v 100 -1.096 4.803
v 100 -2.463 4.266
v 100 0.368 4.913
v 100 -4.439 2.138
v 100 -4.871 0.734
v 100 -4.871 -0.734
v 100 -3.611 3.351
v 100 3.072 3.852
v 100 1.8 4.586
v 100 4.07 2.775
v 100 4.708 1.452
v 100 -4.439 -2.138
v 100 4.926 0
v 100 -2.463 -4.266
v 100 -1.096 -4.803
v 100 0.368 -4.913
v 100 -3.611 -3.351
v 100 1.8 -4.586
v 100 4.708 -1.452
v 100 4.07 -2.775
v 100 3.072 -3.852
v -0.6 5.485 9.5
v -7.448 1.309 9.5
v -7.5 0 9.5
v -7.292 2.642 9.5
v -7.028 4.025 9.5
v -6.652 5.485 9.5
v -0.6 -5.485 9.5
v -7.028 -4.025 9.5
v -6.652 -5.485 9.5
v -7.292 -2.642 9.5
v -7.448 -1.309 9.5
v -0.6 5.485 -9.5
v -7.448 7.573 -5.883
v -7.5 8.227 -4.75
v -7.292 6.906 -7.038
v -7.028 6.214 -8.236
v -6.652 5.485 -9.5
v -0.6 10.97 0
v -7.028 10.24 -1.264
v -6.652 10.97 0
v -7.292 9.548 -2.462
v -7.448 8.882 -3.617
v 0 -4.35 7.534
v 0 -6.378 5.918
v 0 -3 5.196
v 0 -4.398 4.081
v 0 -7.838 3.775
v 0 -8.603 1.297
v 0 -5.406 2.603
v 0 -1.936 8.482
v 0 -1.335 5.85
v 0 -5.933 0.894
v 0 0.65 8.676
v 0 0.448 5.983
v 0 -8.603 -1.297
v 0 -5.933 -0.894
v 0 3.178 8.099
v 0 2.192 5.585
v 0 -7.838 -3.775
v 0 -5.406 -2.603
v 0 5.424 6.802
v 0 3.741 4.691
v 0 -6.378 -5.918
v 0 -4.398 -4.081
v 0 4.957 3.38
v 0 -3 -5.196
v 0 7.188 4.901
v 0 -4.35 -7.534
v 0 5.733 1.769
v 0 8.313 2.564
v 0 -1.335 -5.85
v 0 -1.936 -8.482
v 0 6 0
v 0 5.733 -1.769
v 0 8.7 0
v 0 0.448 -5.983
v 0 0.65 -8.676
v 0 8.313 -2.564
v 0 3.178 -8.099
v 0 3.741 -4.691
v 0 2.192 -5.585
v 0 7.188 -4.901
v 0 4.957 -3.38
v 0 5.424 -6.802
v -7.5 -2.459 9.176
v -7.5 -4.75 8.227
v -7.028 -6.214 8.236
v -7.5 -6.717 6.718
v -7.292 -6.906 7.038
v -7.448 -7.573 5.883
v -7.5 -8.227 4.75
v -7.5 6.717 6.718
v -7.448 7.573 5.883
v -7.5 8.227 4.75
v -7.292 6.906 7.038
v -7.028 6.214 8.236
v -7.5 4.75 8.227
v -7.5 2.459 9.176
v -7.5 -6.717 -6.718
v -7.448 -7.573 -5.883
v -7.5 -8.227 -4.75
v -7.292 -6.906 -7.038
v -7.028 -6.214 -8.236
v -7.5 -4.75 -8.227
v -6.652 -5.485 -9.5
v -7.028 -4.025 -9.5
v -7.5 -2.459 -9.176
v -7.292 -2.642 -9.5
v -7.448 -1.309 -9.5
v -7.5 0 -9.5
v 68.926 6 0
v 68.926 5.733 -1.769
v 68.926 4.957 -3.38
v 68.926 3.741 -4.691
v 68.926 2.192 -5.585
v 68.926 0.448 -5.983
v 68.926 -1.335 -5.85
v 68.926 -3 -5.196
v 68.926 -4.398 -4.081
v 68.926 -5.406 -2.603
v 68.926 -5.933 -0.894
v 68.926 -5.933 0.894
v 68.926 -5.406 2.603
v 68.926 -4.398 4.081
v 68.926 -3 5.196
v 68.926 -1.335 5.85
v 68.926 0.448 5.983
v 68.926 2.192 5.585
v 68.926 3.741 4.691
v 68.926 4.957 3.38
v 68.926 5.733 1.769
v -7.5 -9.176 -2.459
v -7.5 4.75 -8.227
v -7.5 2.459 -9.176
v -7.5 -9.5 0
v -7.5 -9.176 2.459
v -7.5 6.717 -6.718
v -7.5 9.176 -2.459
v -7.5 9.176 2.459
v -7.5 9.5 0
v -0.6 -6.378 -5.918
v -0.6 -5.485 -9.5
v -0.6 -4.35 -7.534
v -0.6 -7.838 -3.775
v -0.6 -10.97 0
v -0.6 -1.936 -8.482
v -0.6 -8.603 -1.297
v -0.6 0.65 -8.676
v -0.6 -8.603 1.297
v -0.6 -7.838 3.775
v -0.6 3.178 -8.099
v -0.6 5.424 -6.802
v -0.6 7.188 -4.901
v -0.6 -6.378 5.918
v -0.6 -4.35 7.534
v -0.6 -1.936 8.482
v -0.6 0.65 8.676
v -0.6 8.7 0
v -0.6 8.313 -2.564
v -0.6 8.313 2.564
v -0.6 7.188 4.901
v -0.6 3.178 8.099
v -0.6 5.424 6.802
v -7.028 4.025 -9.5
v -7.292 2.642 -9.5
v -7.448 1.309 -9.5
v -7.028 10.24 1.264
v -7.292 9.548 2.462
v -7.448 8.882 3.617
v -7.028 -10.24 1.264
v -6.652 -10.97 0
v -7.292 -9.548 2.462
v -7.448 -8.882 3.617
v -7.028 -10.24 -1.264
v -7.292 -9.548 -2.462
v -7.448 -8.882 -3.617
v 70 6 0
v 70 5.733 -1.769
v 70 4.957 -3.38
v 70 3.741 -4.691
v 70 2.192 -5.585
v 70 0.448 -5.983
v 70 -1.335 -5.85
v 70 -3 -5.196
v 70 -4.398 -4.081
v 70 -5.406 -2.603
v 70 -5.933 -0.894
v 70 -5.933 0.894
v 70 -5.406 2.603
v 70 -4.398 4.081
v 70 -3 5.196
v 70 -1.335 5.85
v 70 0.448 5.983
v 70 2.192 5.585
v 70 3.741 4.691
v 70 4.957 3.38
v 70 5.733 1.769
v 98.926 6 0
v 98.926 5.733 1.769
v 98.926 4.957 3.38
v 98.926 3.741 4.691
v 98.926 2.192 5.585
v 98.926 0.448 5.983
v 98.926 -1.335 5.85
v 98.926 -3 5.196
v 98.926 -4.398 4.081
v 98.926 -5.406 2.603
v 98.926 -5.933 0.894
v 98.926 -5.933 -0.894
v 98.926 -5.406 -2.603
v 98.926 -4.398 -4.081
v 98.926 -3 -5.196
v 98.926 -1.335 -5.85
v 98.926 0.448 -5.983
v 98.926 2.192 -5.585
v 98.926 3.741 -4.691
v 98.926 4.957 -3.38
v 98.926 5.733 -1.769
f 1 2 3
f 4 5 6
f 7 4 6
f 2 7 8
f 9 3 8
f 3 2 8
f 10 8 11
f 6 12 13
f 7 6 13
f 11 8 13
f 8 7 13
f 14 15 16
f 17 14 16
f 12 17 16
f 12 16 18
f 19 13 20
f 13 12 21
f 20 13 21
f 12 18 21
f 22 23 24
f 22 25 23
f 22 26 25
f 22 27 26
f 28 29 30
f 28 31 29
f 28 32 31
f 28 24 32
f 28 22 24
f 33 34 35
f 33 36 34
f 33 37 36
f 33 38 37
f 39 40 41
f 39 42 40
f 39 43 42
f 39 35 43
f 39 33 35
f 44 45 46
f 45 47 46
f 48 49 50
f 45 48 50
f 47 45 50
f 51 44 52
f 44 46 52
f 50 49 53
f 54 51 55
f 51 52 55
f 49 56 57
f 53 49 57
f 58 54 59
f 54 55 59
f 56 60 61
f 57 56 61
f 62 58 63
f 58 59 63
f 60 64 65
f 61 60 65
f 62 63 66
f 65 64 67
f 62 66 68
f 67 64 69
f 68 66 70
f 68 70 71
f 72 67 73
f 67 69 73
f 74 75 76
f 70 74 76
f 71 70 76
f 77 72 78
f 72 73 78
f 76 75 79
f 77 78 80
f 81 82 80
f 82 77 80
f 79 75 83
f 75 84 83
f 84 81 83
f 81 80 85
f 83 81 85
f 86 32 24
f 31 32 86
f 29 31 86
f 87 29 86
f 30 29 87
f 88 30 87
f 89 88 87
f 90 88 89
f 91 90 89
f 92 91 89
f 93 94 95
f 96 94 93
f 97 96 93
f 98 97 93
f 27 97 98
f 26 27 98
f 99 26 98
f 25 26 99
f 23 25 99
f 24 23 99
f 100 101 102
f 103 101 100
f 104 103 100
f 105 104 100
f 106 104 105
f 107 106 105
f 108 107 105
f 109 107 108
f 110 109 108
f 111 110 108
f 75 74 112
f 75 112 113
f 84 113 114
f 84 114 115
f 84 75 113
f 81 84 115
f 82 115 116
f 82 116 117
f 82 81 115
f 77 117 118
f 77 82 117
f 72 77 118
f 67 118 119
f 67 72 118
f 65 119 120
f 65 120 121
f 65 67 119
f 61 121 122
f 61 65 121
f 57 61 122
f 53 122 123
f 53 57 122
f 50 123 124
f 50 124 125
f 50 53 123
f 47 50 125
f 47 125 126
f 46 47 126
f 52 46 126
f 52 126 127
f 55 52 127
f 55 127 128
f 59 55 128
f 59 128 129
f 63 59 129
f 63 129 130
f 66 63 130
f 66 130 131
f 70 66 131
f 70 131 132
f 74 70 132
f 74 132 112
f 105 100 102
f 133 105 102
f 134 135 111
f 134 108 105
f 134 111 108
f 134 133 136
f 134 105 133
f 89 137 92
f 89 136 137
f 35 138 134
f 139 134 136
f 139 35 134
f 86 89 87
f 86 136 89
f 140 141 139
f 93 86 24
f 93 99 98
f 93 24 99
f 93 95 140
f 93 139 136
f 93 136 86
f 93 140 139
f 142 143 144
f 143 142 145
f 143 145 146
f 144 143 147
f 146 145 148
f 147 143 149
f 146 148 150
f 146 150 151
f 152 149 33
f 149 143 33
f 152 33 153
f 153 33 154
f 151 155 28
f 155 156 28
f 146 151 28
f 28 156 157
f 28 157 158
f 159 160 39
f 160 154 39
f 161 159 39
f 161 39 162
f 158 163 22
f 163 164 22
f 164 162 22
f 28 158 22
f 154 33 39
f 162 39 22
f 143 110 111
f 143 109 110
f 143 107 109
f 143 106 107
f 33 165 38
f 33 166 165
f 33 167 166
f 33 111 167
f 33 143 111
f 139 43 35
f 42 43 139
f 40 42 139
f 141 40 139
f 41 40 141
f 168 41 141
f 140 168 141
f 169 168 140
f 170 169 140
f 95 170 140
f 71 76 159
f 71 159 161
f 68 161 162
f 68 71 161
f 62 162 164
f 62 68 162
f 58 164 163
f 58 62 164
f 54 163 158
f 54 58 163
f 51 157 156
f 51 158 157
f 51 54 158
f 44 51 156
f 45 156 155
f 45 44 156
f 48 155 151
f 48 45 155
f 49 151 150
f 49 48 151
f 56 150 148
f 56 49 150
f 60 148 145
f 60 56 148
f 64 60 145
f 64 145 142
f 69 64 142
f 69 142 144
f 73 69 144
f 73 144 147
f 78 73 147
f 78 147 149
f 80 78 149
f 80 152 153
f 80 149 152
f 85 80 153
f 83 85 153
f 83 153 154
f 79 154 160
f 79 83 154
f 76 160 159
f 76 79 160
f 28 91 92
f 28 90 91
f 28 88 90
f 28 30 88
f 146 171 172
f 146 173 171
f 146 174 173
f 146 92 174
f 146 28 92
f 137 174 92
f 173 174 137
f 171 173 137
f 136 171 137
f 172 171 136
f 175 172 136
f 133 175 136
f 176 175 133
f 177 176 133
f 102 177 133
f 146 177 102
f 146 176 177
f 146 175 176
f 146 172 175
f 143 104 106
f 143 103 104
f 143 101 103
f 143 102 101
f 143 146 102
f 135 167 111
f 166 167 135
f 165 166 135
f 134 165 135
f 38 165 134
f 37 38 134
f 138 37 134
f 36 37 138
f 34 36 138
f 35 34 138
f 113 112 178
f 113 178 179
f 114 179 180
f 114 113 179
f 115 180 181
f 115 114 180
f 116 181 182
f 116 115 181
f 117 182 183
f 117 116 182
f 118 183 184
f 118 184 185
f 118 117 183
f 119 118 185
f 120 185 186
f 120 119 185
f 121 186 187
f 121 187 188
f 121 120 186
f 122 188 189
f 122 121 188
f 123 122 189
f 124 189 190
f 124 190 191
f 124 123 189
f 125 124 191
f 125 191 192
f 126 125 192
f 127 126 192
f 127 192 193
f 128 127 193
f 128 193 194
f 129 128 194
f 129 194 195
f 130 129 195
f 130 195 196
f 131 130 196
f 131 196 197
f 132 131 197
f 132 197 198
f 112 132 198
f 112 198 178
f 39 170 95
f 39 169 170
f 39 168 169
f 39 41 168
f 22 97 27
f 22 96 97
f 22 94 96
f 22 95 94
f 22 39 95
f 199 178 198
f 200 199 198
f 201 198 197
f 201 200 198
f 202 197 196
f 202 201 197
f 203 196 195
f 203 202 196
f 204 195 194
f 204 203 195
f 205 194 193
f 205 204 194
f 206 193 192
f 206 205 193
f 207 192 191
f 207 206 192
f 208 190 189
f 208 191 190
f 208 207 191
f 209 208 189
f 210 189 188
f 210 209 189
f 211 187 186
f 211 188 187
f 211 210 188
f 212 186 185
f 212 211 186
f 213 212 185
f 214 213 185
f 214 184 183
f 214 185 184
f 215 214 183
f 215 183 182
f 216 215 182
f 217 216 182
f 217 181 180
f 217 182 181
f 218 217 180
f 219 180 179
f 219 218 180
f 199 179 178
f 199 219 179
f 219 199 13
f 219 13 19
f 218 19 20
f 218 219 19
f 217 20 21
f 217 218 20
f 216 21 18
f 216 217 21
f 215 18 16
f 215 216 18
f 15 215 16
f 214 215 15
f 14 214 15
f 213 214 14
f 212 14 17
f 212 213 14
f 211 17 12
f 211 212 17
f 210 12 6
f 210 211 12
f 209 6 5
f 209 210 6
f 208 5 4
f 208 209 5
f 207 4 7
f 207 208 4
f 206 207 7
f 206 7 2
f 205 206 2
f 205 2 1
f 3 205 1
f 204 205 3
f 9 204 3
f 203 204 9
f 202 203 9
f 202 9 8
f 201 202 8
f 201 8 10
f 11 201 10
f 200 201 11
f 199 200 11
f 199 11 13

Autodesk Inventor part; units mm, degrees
ref_plane "YZ Plane" through (0, 0, 0) normal (1, 0, 0) x (0, 1, 0)
ref_plane "XZ Plane" through (0, 0, 0) normal (0, 1, 0) x (-1, 0, 0)
sketch "Sketch1" plane through (0, 0, 0) normal (0, 0, 1) x (1, 0, 0)
  line L0 (0, 8.7) -> (0, 6)
  line L1 (70, 6) -> (100, 6)
  line L2 (100, 6) -> (100, 0)
  line L3 (100, 0) -> (-0.6001, 0)
  line L4 (-20.7201, 0) -> (120.12, 0) projected
  line L5 (-0.6001, 0) -> (-0.6001, 8.7)
  line L6 (-0.6001, 8.7) -> (0, 8.7)
  line L7 (70, 6) -> (68.9264, 6)
  line L8 (68.9264, 6) -> (0, 6)
  line L9 (0, -1.74) -> (0, 10.44) projected
  dimension "d0" = 100
  dimension "d1" = 30
  dimension "d2" = 12
  dimension "d9" = 0.6001
  dimension "d10" = 17.4
  dimension "d13" = 1.0736
  dimension "d14" = 12
revolve "Body" add sketch "Sketch1" angle 360 about axis through (100, 0, 0) along (-1, 0, 0)
sketch "Sketch2" plane through (-0.6001, 0, 0) normal (-1, 0, 0) x (0, 0, 1)
  line L0 (0, 10.9697) -> (9.5, 5.4848)
  line L1 (9.5, 5.4848) -> (9.5, -5.4848)
  line L2 (9.5, -5.4848) -> (0, -10.9697)
  line L3 (0, -10.9697) -> (-9.5, -5.4848)
  line L4 (-9.5, -5.4848) -> (-9.5, 5.4848)
  line L5 (-9.5, 5.4848) -> (0, 10.9697)
  point P0 (0, 0)
  point P1 (0, 0)
  dimension "d11" = 19
extrude "Head" add sketch "Sketch2" along normal blind 6.9
sketch "Sketch4" plane through (0, 0, 0) normal (0, 0, 1) x (1, 0, 0)
  line L0 (-7.5001, 9.5) -> (-7.5001, 10.9697)
  line L1 (-7.5001, 10.9697) -> (-6.6516, 10.9697)
  line L2 (-6.6516, 10.9697) -> (-7.5001, 9.5)
  line L3 (-8.8801, 0) -> (0.7799, 0) projected
  line L4 (-0.6001, 10.9697) -> (-7.5001, 10.9697) projected
  line L5 (-7.5001, 5.4848) -> (-7.5001, 10.9697) projected
  dimension "d5" = 30
  dimension "d19" = 19
revolve "Chamfer1" cut sketch "Sketch4" angle 360 about axis through (-10, 0, 0) along (1, 0, 0)
thread "Thread" size "M12x1.75" class "6g" standard "ISO Metric profile" length 30
chamfer "Chamfer2" distance 1.0735 distance2 1.0736 1 edges at (100, -6, 0) measured on face at (100, 1.8579, -1.646)
ref_plane "Work Plane1" through (1.525, 0, 0) normal (0, 0, 1) x (1, 0, 0)
equation "\"d0\" = NLG"
equation "\"d1\" = GEL"
equation "\"d2\" = GD"
equation "\"d10\" = SD2"
equation "\"d14\" = BDM"
equation "\"d11\" = SW"
equation "\"d3\" = KOH - SD"
equation "\"d5\" = ANG1"
equation "\"d19\" = SW0"
equation "\"d15\" = GEL"
equation "\"d6\" = -0.5 * SPD + 0.5 * GD"
equation "\"NLG\" = 100"
equation "\"GD\" = NND"
equation "\"BDM\" = NND"
equation "\"KOH\" = 7.5"
equation "\"GEL\" = 30"
equation "\"SW\" = 19"
equation "\"SW0\" = SW"
equation "\"SPD\" = NND - 1.2269 * PTC"
equation "\"SD2\" = 17.4"
equation "\"SD\" = 0.6"
equation "\"ANG1\" = 30deg"
equation "\"GAL\" = 0.61345 * PTC"
equation "\"GUL\" = 0.61345 * PTC"
equation "\"RR\" = 0.6"
equation "\"GD1\" = THREADDIA - 1.2269 * PTC"
equation "\"THREADDIA\" = 12"
equation "\"TOA\" = 30deg"
equation "\"PTC\" = 1.75"
equation "\"NND\" = 12"
equation "\"E0\" = 1.155 * SW"
properties part number "DIN 931-1 - M12 x 100" material "Steel, Mild"
